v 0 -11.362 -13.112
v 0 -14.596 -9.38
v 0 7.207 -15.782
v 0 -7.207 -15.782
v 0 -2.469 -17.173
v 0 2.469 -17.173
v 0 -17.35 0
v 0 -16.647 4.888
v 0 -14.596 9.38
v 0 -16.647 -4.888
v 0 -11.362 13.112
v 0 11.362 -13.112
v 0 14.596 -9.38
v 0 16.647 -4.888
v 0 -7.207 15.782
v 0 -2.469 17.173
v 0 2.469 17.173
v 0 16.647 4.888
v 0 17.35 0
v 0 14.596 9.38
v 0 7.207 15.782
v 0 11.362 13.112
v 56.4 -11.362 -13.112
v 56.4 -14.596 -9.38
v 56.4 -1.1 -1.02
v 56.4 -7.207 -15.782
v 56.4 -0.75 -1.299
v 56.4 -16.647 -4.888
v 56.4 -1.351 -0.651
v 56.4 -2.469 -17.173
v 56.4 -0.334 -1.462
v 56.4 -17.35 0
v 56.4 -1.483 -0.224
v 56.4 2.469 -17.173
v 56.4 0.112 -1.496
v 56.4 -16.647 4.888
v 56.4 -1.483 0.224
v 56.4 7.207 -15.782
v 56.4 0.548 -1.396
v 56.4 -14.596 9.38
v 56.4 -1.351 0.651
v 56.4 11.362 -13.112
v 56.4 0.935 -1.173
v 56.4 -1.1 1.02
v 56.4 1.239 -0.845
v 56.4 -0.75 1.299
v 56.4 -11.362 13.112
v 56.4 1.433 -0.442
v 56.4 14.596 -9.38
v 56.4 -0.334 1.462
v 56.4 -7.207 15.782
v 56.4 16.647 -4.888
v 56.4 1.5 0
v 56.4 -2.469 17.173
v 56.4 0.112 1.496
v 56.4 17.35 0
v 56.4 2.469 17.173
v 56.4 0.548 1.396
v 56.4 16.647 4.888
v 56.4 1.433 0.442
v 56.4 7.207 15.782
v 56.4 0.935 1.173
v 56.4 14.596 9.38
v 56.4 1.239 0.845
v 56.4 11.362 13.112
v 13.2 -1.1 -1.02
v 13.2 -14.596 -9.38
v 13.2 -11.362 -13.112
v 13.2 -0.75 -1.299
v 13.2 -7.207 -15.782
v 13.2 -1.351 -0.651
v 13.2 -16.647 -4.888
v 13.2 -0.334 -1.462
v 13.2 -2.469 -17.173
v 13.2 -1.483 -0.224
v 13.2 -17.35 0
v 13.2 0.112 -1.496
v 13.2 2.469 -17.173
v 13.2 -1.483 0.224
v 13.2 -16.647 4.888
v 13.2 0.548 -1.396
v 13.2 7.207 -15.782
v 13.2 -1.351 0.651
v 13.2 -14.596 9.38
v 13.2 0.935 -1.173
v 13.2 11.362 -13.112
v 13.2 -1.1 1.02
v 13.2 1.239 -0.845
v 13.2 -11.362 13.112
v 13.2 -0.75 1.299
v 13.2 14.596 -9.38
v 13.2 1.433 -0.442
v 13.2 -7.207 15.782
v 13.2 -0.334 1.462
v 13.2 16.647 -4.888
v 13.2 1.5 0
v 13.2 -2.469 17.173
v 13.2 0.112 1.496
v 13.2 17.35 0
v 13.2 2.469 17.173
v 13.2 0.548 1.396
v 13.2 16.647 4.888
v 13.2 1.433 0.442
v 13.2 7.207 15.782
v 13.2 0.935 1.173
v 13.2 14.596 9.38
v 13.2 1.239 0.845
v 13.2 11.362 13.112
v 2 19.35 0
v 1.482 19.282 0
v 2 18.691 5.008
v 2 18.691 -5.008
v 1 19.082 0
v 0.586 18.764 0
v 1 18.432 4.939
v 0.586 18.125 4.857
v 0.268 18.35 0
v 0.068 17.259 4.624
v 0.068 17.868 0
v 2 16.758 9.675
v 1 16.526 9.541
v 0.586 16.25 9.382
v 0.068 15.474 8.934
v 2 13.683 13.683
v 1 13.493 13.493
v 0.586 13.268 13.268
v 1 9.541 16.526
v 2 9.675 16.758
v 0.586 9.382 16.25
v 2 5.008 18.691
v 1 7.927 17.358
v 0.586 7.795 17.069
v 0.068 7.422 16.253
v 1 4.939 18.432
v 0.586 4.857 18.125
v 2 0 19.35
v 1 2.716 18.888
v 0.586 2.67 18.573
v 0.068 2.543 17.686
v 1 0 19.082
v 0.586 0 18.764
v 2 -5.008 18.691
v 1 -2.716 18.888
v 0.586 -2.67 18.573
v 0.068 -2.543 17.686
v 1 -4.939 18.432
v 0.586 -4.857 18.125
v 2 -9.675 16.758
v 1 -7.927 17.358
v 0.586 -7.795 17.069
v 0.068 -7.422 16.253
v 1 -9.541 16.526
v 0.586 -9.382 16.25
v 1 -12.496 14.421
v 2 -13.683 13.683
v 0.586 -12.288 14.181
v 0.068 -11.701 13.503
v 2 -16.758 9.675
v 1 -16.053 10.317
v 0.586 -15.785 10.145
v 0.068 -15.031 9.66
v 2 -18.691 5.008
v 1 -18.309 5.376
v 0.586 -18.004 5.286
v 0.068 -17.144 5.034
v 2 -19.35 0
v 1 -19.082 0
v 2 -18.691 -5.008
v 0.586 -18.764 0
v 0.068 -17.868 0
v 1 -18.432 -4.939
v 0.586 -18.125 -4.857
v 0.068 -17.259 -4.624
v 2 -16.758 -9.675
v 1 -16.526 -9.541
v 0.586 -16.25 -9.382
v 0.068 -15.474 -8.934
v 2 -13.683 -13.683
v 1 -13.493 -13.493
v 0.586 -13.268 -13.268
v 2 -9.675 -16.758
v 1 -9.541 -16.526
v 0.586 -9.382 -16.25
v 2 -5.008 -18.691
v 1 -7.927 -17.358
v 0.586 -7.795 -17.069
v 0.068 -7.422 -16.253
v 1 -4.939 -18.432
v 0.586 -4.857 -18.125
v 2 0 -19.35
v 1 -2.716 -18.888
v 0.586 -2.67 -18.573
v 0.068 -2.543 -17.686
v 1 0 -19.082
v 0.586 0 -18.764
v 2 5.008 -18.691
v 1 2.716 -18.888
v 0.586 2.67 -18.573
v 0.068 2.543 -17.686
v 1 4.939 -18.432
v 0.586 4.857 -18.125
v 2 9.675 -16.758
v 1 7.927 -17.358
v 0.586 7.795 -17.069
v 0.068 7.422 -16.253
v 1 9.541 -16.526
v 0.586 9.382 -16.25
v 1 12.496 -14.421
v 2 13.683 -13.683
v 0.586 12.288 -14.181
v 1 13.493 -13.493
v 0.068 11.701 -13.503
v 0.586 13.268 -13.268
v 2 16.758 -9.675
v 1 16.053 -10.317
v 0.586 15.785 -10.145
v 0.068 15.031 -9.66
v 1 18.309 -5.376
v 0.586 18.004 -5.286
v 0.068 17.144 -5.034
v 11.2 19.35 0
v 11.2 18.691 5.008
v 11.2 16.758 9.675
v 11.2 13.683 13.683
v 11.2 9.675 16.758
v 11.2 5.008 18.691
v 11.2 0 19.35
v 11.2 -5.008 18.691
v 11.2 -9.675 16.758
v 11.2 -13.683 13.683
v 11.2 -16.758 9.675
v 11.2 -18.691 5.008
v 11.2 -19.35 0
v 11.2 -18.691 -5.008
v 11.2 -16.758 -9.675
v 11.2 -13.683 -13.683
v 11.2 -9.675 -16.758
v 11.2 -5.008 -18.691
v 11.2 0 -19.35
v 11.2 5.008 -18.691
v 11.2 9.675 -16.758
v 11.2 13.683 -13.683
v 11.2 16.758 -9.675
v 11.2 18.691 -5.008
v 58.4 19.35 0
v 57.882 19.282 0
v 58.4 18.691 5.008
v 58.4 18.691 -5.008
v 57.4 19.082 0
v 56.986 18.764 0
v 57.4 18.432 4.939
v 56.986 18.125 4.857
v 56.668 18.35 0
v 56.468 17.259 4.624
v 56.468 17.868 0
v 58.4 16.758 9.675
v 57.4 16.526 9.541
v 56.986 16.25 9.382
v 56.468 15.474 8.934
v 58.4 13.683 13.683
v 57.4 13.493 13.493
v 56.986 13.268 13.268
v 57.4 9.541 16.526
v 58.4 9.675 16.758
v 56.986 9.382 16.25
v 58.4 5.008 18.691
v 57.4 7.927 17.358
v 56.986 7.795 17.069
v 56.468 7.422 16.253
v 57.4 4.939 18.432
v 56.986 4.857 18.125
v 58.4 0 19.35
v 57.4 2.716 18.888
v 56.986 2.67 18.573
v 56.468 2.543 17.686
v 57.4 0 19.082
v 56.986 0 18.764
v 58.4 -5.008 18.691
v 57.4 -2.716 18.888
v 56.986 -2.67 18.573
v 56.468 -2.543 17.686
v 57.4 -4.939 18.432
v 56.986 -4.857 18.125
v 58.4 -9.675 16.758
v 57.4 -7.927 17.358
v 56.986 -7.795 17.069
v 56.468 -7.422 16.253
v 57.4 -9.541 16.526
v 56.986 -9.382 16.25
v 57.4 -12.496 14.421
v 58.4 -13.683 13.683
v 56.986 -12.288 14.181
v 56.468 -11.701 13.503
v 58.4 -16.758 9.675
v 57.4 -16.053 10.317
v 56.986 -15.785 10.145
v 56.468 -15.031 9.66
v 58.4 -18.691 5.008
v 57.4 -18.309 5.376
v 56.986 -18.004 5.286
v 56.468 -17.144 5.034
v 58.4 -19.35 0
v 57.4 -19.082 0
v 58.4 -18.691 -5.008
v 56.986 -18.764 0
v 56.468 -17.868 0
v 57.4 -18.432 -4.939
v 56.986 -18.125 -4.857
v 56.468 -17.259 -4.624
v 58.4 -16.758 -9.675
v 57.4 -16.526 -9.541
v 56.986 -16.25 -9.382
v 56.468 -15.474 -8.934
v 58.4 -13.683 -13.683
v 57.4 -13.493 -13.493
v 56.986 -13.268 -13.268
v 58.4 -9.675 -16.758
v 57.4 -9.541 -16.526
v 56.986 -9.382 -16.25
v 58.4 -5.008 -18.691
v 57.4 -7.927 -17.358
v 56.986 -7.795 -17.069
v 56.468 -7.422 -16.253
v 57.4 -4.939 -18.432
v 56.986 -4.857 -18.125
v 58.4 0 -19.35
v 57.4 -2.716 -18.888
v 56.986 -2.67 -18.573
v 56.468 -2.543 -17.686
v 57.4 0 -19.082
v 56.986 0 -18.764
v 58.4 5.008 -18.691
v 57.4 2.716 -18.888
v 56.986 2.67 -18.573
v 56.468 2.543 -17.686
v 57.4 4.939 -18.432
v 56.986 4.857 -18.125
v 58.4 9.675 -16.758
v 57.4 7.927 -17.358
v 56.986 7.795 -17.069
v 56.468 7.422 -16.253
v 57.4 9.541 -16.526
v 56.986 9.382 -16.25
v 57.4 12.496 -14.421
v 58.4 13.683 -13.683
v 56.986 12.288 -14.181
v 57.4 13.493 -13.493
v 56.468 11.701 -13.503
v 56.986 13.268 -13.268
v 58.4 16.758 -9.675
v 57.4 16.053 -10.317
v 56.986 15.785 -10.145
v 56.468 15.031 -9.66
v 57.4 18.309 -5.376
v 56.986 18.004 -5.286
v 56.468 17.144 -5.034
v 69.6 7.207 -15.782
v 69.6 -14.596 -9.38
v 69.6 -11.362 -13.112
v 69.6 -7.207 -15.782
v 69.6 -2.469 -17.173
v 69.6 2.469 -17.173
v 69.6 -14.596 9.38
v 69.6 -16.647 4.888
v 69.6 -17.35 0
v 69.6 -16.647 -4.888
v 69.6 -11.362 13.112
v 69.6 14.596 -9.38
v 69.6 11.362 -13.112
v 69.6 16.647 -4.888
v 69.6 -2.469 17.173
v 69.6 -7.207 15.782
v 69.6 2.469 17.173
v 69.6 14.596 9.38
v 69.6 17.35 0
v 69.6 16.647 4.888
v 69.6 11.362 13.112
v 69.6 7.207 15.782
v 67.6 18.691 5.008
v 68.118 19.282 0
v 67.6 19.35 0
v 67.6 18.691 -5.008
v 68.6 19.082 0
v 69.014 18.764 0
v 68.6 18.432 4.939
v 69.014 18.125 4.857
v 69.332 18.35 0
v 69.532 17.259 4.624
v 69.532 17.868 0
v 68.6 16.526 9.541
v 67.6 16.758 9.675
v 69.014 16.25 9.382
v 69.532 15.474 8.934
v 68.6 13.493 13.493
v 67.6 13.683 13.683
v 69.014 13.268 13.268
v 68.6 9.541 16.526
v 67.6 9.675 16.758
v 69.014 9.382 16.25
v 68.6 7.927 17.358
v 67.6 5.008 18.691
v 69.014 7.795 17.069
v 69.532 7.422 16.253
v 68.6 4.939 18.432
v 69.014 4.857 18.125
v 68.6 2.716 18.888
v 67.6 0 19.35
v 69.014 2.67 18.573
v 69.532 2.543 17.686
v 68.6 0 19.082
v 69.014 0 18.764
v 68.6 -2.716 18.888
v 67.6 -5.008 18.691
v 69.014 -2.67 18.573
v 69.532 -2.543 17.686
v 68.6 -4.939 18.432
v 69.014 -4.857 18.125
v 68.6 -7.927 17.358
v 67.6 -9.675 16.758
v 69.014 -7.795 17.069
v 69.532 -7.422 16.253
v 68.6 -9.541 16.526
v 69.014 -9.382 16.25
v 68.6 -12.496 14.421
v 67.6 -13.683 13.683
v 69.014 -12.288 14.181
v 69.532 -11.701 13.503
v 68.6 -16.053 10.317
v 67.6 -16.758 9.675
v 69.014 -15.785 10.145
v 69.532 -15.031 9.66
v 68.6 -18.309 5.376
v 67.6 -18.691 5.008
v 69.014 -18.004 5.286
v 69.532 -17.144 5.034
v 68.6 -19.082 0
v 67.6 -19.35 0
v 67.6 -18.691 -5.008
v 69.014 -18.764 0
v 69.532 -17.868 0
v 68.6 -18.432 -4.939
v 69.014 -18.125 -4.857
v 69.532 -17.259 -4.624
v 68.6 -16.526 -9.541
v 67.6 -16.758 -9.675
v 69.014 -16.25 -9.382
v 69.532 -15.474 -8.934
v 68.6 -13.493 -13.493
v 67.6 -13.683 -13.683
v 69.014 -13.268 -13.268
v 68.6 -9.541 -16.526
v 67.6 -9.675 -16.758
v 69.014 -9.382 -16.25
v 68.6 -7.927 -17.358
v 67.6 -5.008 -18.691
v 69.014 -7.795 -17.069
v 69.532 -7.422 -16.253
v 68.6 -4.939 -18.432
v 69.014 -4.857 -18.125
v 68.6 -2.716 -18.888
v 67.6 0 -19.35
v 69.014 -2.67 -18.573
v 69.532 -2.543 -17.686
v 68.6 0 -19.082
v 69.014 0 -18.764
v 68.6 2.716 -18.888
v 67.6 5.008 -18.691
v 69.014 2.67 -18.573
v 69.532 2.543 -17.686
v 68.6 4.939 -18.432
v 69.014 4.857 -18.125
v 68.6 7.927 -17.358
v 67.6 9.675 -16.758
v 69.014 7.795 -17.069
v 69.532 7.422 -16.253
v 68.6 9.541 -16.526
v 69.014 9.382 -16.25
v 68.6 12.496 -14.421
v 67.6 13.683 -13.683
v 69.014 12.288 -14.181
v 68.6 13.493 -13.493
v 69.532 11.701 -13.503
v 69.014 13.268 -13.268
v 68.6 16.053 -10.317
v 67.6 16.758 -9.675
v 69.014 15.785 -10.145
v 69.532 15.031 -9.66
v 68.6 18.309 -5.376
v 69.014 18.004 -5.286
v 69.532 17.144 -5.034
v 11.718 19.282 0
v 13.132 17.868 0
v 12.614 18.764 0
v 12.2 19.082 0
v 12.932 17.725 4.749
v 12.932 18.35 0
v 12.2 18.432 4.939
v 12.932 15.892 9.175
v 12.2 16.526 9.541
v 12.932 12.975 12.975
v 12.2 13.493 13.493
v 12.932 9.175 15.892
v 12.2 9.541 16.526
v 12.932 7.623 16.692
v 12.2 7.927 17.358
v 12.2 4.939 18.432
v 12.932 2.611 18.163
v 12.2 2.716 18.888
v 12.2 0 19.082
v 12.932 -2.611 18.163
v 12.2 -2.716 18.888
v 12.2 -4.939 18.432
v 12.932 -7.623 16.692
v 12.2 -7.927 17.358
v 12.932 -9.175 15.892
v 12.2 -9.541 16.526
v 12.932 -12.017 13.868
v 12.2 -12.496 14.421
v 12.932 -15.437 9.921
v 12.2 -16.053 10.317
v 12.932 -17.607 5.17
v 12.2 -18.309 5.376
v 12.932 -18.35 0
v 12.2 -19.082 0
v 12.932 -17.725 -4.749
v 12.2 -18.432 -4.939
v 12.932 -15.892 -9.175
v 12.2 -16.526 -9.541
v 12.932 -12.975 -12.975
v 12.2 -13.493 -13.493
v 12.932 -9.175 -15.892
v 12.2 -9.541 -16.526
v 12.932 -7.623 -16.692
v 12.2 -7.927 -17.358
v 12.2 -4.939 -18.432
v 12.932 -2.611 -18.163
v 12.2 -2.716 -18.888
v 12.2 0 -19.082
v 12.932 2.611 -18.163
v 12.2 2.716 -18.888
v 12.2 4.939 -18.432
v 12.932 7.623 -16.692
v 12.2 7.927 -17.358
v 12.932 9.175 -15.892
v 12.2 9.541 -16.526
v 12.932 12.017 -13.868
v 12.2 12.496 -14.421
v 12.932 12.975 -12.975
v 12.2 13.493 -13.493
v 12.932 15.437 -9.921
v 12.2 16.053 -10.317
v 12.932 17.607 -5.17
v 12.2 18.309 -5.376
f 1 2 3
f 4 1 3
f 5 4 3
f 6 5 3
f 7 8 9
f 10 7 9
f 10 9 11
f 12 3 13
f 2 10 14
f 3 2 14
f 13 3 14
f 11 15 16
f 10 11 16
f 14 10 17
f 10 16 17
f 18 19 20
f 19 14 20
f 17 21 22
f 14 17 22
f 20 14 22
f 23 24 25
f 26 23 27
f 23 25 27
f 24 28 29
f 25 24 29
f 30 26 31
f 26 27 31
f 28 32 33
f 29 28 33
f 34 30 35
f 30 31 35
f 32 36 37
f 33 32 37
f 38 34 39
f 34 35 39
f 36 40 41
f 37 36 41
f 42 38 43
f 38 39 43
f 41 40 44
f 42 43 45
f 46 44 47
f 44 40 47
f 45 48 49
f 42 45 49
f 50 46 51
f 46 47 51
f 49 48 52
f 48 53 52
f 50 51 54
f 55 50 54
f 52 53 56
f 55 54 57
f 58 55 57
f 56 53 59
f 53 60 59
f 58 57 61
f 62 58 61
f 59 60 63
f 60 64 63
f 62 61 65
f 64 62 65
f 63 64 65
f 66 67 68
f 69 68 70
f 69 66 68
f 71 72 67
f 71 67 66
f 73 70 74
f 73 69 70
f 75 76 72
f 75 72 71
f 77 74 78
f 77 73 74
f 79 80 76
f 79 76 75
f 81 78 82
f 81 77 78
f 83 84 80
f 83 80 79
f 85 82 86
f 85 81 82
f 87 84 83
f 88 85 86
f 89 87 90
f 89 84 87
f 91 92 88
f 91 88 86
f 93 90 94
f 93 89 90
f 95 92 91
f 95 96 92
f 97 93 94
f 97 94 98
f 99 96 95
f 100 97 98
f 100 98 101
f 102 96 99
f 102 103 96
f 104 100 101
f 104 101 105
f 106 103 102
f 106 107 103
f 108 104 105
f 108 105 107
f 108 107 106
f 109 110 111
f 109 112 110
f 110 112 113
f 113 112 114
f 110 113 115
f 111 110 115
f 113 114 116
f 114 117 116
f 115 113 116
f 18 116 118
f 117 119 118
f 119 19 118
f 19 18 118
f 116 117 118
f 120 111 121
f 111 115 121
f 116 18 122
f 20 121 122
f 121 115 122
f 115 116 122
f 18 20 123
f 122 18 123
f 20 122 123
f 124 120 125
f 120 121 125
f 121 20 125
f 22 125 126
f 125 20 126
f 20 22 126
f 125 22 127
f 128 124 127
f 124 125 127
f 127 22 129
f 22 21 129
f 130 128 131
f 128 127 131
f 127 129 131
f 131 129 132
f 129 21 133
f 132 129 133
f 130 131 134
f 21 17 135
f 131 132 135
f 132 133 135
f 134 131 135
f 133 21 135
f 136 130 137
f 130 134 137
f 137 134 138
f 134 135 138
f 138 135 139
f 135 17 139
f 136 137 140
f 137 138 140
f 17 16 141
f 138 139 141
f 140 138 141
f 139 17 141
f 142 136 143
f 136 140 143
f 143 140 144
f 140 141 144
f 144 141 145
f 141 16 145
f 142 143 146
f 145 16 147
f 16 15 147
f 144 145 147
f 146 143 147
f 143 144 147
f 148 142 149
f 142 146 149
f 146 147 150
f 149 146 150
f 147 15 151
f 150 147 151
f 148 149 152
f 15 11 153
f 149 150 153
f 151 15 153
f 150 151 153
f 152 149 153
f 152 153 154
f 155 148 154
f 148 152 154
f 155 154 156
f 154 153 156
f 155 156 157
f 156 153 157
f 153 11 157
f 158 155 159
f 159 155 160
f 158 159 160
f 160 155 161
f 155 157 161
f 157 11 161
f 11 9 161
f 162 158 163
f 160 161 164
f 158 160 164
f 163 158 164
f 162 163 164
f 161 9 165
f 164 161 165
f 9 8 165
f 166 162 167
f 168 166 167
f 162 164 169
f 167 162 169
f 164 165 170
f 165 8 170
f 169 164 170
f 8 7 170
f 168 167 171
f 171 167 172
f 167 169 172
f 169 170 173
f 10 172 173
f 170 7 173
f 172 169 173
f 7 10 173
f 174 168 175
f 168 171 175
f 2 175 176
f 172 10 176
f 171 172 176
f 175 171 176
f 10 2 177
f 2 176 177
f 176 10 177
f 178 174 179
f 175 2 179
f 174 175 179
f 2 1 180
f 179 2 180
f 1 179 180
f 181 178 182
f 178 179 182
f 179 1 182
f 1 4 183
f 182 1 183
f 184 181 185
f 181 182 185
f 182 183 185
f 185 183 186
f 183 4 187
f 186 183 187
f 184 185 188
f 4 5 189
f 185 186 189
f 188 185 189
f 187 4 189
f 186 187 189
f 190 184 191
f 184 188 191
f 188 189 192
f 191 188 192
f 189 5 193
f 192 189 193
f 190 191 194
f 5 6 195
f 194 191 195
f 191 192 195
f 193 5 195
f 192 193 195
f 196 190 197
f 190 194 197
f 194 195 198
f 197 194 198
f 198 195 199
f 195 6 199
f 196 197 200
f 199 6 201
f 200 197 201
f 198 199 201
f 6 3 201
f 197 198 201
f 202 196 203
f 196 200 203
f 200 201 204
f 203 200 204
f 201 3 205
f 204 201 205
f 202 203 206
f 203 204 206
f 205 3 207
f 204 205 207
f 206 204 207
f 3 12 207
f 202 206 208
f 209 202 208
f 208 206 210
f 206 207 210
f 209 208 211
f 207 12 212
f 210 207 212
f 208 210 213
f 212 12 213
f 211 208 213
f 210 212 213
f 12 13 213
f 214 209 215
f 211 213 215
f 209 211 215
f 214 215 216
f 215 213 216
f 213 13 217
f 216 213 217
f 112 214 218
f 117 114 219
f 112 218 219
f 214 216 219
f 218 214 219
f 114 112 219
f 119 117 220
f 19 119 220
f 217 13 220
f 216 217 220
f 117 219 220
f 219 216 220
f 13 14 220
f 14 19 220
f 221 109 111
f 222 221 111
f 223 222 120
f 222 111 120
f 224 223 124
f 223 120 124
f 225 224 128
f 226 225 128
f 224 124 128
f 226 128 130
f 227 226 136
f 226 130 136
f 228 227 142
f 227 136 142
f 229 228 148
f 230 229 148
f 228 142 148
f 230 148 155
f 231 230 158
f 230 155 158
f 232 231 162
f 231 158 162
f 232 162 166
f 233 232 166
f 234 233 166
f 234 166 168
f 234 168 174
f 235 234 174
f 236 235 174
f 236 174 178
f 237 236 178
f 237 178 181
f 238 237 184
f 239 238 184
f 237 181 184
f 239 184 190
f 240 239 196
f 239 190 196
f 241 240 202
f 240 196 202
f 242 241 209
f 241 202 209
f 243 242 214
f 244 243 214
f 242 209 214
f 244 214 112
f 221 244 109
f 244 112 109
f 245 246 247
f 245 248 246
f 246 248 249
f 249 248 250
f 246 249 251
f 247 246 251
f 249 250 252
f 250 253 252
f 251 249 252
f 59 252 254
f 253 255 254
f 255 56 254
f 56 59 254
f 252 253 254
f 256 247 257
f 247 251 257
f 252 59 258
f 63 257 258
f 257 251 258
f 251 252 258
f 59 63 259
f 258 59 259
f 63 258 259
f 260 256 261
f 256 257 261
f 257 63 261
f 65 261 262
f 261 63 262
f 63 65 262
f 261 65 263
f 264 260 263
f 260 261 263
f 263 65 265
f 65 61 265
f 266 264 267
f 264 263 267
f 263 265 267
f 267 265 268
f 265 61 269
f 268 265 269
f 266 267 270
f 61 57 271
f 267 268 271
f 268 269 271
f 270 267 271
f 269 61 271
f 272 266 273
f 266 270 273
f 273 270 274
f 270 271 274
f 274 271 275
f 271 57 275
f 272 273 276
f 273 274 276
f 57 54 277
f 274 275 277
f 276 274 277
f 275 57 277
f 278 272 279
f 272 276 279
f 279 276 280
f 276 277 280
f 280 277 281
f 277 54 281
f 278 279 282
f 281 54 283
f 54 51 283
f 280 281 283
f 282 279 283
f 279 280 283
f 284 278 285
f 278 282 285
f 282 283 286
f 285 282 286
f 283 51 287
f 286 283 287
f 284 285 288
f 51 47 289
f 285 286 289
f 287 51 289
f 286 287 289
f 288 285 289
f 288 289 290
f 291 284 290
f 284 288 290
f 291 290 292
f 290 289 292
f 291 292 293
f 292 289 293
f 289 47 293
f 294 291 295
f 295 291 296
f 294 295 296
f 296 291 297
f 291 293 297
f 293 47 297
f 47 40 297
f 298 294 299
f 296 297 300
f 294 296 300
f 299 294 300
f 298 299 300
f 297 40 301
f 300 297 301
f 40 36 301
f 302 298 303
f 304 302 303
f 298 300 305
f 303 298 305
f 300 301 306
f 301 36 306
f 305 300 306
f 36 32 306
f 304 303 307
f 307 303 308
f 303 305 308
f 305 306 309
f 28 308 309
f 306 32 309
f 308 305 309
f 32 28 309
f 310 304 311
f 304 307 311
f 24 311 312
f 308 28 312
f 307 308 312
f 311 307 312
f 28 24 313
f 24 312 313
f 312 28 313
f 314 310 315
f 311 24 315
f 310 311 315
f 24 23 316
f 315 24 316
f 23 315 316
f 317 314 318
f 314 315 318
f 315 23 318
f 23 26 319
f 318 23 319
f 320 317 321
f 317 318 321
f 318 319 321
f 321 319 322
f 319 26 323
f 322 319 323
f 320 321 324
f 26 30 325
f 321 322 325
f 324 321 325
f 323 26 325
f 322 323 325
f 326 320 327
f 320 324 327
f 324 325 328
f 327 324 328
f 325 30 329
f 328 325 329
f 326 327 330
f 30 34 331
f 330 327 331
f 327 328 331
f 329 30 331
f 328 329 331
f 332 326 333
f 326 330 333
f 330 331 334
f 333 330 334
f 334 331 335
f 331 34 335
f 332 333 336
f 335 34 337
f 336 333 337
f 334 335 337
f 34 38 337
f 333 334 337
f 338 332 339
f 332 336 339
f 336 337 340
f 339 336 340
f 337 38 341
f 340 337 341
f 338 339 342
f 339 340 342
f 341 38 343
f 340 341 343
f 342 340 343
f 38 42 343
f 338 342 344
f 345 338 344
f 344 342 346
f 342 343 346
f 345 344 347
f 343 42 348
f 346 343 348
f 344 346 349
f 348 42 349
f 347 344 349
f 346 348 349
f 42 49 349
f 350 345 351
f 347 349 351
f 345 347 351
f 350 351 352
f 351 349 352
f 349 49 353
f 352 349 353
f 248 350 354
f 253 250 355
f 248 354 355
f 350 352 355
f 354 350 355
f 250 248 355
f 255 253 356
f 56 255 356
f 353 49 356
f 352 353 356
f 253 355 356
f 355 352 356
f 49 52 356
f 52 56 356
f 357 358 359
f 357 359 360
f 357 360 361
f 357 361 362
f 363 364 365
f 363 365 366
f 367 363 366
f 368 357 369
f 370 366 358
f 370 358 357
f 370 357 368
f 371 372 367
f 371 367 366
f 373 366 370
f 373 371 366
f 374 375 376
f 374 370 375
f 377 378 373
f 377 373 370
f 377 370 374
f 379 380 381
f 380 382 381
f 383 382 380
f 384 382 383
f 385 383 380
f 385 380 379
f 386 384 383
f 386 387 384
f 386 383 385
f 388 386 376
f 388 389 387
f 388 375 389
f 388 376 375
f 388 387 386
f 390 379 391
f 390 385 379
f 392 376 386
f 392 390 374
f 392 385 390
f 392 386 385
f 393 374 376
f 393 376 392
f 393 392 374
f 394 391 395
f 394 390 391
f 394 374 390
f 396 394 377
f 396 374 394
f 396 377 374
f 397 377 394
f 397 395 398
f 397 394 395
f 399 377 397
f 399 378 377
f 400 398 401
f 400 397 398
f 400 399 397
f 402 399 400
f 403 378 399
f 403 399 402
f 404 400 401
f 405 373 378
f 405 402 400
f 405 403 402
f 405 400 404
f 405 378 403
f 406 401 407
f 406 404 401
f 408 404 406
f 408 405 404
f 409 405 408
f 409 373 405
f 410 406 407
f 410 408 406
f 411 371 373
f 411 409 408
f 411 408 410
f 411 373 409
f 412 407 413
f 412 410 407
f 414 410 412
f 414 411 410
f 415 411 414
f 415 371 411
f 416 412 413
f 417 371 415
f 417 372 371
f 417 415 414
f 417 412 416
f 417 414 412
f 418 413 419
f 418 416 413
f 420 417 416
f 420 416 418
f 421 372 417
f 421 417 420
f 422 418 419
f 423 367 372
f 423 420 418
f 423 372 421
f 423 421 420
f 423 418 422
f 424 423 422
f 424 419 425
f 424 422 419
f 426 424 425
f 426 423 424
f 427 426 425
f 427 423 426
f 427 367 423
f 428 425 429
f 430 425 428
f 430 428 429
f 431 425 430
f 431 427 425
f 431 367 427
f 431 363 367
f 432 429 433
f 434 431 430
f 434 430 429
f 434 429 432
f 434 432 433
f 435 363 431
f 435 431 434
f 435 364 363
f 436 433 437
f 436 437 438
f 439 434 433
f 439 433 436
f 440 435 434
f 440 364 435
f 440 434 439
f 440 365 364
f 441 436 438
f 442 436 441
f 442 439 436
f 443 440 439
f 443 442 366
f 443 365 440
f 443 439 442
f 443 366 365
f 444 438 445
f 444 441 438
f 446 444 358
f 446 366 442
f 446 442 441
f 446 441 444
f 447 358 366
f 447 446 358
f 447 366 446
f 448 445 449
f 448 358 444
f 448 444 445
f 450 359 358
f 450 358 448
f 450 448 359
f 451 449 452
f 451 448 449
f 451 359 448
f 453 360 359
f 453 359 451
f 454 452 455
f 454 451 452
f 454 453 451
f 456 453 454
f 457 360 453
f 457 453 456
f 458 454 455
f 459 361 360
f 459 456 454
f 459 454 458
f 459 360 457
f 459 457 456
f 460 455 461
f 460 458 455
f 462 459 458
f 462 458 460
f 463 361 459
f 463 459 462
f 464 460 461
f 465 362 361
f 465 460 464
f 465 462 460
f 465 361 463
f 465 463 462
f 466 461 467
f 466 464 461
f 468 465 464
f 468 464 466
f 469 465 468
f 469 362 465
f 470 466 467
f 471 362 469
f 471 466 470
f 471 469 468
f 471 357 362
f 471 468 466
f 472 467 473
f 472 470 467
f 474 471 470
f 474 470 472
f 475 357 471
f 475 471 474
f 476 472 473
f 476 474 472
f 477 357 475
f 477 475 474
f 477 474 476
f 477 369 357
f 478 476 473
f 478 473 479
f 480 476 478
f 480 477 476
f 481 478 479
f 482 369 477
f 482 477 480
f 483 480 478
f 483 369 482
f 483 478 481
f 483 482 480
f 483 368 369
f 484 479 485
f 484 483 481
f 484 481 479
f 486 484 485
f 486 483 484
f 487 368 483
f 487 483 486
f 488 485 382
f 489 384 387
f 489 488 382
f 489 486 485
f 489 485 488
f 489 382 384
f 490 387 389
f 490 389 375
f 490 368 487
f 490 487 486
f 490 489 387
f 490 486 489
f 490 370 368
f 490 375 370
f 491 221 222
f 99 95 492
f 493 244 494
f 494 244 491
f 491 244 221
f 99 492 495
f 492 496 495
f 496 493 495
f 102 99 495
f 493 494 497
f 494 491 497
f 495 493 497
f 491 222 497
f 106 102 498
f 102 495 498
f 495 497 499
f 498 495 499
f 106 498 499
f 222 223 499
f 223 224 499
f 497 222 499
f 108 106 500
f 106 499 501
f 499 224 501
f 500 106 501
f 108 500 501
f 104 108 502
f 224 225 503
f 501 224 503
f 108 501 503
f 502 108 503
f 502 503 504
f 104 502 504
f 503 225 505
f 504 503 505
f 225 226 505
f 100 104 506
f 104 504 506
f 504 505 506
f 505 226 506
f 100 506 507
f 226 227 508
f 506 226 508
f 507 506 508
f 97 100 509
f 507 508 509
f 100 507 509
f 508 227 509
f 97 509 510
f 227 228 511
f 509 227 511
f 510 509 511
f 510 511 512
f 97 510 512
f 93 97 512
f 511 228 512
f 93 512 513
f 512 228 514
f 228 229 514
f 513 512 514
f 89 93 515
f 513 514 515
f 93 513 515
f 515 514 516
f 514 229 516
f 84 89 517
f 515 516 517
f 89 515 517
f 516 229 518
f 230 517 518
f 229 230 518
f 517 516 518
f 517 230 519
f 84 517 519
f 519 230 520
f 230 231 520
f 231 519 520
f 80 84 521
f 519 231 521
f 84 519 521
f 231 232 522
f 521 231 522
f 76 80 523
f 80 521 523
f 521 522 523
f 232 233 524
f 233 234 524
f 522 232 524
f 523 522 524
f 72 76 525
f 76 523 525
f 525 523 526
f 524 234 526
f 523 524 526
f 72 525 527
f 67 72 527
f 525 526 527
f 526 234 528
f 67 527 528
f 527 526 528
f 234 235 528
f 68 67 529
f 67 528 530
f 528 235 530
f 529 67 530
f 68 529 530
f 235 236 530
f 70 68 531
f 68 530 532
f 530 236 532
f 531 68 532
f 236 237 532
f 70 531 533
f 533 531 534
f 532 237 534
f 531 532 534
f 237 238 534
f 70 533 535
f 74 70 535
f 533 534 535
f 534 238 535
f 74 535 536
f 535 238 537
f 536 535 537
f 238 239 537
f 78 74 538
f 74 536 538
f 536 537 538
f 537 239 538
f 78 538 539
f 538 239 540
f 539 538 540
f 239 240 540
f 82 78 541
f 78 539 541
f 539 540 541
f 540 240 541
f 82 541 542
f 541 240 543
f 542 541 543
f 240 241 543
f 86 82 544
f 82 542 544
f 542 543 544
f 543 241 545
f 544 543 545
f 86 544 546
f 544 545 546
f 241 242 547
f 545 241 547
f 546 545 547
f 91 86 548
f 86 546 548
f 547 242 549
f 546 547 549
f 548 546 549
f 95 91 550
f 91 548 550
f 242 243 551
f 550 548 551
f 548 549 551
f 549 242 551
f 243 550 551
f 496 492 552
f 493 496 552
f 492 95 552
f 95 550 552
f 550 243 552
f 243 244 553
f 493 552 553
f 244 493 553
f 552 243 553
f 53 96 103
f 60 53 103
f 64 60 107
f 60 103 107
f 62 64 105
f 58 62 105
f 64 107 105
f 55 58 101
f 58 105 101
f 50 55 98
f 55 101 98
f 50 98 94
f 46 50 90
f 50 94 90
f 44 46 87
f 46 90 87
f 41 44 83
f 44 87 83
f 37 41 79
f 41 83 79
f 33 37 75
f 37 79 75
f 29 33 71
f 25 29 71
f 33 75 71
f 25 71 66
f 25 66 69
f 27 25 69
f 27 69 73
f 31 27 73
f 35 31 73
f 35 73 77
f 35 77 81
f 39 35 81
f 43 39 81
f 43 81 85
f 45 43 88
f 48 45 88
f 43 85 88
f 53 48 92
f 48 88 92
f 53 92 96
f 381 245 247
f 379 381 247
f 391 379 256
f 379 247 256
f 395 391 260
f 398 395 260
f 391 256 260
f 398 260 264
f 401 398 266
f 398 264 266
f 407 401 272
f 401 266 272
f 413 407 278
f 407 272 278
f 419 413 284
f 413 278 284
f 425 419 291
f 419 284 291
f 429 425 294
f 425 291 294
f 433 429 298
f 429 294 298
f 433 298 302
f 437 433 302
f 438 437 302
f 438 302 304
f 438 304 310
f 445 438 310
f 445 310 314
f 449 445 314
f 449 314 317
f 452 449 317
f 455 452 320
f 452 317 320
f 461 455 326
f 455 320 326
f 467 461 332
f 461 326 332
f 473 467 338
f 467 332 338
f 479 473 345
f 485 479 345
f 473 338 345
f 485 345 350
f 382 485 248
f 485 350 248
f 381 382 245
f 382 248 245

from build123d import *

# Parameters (mm, degrees)
F0_R     = 19.35
F1_DEPTH = 13.2
F2_R     = 1.5
F3_DEPTH = 43.2
F4_R     = 19.35
F5_DEPTH = 13.2
F6_R     = 2


with BuildPart() as f1:
    # F0 (on Right) → F1 (new body)
    with BuildSketch(Plane.YZ):
        Circle(F0_R)
    extrude(amount=F1_DEPTH)

    # F2 (on face) → F3 (join)
    with BuildSketch(Plane.YZ.offset(13.2)):
        Circle(F2_R)
    extrude(amount=F3_DEPTH)

    # F4 (on face) → F5 (join)
    with BuildSketch(Plane.YZ.offset(56.4)):
        Circle(F4_R)
    extrude(amount=F5_DEPTH)

    # F6
    f6_edges = [f1.edges().sort_by_distance(p)[0] for p in [
        (0, -19.35, 0),
        (13.2, -19.35, 0),
        (56.4, -19.35, 0),
        (69.6, -19.35, 0),
    ]]
    fillet(f6_edges, radius=F6_R)


solid = f1.part
